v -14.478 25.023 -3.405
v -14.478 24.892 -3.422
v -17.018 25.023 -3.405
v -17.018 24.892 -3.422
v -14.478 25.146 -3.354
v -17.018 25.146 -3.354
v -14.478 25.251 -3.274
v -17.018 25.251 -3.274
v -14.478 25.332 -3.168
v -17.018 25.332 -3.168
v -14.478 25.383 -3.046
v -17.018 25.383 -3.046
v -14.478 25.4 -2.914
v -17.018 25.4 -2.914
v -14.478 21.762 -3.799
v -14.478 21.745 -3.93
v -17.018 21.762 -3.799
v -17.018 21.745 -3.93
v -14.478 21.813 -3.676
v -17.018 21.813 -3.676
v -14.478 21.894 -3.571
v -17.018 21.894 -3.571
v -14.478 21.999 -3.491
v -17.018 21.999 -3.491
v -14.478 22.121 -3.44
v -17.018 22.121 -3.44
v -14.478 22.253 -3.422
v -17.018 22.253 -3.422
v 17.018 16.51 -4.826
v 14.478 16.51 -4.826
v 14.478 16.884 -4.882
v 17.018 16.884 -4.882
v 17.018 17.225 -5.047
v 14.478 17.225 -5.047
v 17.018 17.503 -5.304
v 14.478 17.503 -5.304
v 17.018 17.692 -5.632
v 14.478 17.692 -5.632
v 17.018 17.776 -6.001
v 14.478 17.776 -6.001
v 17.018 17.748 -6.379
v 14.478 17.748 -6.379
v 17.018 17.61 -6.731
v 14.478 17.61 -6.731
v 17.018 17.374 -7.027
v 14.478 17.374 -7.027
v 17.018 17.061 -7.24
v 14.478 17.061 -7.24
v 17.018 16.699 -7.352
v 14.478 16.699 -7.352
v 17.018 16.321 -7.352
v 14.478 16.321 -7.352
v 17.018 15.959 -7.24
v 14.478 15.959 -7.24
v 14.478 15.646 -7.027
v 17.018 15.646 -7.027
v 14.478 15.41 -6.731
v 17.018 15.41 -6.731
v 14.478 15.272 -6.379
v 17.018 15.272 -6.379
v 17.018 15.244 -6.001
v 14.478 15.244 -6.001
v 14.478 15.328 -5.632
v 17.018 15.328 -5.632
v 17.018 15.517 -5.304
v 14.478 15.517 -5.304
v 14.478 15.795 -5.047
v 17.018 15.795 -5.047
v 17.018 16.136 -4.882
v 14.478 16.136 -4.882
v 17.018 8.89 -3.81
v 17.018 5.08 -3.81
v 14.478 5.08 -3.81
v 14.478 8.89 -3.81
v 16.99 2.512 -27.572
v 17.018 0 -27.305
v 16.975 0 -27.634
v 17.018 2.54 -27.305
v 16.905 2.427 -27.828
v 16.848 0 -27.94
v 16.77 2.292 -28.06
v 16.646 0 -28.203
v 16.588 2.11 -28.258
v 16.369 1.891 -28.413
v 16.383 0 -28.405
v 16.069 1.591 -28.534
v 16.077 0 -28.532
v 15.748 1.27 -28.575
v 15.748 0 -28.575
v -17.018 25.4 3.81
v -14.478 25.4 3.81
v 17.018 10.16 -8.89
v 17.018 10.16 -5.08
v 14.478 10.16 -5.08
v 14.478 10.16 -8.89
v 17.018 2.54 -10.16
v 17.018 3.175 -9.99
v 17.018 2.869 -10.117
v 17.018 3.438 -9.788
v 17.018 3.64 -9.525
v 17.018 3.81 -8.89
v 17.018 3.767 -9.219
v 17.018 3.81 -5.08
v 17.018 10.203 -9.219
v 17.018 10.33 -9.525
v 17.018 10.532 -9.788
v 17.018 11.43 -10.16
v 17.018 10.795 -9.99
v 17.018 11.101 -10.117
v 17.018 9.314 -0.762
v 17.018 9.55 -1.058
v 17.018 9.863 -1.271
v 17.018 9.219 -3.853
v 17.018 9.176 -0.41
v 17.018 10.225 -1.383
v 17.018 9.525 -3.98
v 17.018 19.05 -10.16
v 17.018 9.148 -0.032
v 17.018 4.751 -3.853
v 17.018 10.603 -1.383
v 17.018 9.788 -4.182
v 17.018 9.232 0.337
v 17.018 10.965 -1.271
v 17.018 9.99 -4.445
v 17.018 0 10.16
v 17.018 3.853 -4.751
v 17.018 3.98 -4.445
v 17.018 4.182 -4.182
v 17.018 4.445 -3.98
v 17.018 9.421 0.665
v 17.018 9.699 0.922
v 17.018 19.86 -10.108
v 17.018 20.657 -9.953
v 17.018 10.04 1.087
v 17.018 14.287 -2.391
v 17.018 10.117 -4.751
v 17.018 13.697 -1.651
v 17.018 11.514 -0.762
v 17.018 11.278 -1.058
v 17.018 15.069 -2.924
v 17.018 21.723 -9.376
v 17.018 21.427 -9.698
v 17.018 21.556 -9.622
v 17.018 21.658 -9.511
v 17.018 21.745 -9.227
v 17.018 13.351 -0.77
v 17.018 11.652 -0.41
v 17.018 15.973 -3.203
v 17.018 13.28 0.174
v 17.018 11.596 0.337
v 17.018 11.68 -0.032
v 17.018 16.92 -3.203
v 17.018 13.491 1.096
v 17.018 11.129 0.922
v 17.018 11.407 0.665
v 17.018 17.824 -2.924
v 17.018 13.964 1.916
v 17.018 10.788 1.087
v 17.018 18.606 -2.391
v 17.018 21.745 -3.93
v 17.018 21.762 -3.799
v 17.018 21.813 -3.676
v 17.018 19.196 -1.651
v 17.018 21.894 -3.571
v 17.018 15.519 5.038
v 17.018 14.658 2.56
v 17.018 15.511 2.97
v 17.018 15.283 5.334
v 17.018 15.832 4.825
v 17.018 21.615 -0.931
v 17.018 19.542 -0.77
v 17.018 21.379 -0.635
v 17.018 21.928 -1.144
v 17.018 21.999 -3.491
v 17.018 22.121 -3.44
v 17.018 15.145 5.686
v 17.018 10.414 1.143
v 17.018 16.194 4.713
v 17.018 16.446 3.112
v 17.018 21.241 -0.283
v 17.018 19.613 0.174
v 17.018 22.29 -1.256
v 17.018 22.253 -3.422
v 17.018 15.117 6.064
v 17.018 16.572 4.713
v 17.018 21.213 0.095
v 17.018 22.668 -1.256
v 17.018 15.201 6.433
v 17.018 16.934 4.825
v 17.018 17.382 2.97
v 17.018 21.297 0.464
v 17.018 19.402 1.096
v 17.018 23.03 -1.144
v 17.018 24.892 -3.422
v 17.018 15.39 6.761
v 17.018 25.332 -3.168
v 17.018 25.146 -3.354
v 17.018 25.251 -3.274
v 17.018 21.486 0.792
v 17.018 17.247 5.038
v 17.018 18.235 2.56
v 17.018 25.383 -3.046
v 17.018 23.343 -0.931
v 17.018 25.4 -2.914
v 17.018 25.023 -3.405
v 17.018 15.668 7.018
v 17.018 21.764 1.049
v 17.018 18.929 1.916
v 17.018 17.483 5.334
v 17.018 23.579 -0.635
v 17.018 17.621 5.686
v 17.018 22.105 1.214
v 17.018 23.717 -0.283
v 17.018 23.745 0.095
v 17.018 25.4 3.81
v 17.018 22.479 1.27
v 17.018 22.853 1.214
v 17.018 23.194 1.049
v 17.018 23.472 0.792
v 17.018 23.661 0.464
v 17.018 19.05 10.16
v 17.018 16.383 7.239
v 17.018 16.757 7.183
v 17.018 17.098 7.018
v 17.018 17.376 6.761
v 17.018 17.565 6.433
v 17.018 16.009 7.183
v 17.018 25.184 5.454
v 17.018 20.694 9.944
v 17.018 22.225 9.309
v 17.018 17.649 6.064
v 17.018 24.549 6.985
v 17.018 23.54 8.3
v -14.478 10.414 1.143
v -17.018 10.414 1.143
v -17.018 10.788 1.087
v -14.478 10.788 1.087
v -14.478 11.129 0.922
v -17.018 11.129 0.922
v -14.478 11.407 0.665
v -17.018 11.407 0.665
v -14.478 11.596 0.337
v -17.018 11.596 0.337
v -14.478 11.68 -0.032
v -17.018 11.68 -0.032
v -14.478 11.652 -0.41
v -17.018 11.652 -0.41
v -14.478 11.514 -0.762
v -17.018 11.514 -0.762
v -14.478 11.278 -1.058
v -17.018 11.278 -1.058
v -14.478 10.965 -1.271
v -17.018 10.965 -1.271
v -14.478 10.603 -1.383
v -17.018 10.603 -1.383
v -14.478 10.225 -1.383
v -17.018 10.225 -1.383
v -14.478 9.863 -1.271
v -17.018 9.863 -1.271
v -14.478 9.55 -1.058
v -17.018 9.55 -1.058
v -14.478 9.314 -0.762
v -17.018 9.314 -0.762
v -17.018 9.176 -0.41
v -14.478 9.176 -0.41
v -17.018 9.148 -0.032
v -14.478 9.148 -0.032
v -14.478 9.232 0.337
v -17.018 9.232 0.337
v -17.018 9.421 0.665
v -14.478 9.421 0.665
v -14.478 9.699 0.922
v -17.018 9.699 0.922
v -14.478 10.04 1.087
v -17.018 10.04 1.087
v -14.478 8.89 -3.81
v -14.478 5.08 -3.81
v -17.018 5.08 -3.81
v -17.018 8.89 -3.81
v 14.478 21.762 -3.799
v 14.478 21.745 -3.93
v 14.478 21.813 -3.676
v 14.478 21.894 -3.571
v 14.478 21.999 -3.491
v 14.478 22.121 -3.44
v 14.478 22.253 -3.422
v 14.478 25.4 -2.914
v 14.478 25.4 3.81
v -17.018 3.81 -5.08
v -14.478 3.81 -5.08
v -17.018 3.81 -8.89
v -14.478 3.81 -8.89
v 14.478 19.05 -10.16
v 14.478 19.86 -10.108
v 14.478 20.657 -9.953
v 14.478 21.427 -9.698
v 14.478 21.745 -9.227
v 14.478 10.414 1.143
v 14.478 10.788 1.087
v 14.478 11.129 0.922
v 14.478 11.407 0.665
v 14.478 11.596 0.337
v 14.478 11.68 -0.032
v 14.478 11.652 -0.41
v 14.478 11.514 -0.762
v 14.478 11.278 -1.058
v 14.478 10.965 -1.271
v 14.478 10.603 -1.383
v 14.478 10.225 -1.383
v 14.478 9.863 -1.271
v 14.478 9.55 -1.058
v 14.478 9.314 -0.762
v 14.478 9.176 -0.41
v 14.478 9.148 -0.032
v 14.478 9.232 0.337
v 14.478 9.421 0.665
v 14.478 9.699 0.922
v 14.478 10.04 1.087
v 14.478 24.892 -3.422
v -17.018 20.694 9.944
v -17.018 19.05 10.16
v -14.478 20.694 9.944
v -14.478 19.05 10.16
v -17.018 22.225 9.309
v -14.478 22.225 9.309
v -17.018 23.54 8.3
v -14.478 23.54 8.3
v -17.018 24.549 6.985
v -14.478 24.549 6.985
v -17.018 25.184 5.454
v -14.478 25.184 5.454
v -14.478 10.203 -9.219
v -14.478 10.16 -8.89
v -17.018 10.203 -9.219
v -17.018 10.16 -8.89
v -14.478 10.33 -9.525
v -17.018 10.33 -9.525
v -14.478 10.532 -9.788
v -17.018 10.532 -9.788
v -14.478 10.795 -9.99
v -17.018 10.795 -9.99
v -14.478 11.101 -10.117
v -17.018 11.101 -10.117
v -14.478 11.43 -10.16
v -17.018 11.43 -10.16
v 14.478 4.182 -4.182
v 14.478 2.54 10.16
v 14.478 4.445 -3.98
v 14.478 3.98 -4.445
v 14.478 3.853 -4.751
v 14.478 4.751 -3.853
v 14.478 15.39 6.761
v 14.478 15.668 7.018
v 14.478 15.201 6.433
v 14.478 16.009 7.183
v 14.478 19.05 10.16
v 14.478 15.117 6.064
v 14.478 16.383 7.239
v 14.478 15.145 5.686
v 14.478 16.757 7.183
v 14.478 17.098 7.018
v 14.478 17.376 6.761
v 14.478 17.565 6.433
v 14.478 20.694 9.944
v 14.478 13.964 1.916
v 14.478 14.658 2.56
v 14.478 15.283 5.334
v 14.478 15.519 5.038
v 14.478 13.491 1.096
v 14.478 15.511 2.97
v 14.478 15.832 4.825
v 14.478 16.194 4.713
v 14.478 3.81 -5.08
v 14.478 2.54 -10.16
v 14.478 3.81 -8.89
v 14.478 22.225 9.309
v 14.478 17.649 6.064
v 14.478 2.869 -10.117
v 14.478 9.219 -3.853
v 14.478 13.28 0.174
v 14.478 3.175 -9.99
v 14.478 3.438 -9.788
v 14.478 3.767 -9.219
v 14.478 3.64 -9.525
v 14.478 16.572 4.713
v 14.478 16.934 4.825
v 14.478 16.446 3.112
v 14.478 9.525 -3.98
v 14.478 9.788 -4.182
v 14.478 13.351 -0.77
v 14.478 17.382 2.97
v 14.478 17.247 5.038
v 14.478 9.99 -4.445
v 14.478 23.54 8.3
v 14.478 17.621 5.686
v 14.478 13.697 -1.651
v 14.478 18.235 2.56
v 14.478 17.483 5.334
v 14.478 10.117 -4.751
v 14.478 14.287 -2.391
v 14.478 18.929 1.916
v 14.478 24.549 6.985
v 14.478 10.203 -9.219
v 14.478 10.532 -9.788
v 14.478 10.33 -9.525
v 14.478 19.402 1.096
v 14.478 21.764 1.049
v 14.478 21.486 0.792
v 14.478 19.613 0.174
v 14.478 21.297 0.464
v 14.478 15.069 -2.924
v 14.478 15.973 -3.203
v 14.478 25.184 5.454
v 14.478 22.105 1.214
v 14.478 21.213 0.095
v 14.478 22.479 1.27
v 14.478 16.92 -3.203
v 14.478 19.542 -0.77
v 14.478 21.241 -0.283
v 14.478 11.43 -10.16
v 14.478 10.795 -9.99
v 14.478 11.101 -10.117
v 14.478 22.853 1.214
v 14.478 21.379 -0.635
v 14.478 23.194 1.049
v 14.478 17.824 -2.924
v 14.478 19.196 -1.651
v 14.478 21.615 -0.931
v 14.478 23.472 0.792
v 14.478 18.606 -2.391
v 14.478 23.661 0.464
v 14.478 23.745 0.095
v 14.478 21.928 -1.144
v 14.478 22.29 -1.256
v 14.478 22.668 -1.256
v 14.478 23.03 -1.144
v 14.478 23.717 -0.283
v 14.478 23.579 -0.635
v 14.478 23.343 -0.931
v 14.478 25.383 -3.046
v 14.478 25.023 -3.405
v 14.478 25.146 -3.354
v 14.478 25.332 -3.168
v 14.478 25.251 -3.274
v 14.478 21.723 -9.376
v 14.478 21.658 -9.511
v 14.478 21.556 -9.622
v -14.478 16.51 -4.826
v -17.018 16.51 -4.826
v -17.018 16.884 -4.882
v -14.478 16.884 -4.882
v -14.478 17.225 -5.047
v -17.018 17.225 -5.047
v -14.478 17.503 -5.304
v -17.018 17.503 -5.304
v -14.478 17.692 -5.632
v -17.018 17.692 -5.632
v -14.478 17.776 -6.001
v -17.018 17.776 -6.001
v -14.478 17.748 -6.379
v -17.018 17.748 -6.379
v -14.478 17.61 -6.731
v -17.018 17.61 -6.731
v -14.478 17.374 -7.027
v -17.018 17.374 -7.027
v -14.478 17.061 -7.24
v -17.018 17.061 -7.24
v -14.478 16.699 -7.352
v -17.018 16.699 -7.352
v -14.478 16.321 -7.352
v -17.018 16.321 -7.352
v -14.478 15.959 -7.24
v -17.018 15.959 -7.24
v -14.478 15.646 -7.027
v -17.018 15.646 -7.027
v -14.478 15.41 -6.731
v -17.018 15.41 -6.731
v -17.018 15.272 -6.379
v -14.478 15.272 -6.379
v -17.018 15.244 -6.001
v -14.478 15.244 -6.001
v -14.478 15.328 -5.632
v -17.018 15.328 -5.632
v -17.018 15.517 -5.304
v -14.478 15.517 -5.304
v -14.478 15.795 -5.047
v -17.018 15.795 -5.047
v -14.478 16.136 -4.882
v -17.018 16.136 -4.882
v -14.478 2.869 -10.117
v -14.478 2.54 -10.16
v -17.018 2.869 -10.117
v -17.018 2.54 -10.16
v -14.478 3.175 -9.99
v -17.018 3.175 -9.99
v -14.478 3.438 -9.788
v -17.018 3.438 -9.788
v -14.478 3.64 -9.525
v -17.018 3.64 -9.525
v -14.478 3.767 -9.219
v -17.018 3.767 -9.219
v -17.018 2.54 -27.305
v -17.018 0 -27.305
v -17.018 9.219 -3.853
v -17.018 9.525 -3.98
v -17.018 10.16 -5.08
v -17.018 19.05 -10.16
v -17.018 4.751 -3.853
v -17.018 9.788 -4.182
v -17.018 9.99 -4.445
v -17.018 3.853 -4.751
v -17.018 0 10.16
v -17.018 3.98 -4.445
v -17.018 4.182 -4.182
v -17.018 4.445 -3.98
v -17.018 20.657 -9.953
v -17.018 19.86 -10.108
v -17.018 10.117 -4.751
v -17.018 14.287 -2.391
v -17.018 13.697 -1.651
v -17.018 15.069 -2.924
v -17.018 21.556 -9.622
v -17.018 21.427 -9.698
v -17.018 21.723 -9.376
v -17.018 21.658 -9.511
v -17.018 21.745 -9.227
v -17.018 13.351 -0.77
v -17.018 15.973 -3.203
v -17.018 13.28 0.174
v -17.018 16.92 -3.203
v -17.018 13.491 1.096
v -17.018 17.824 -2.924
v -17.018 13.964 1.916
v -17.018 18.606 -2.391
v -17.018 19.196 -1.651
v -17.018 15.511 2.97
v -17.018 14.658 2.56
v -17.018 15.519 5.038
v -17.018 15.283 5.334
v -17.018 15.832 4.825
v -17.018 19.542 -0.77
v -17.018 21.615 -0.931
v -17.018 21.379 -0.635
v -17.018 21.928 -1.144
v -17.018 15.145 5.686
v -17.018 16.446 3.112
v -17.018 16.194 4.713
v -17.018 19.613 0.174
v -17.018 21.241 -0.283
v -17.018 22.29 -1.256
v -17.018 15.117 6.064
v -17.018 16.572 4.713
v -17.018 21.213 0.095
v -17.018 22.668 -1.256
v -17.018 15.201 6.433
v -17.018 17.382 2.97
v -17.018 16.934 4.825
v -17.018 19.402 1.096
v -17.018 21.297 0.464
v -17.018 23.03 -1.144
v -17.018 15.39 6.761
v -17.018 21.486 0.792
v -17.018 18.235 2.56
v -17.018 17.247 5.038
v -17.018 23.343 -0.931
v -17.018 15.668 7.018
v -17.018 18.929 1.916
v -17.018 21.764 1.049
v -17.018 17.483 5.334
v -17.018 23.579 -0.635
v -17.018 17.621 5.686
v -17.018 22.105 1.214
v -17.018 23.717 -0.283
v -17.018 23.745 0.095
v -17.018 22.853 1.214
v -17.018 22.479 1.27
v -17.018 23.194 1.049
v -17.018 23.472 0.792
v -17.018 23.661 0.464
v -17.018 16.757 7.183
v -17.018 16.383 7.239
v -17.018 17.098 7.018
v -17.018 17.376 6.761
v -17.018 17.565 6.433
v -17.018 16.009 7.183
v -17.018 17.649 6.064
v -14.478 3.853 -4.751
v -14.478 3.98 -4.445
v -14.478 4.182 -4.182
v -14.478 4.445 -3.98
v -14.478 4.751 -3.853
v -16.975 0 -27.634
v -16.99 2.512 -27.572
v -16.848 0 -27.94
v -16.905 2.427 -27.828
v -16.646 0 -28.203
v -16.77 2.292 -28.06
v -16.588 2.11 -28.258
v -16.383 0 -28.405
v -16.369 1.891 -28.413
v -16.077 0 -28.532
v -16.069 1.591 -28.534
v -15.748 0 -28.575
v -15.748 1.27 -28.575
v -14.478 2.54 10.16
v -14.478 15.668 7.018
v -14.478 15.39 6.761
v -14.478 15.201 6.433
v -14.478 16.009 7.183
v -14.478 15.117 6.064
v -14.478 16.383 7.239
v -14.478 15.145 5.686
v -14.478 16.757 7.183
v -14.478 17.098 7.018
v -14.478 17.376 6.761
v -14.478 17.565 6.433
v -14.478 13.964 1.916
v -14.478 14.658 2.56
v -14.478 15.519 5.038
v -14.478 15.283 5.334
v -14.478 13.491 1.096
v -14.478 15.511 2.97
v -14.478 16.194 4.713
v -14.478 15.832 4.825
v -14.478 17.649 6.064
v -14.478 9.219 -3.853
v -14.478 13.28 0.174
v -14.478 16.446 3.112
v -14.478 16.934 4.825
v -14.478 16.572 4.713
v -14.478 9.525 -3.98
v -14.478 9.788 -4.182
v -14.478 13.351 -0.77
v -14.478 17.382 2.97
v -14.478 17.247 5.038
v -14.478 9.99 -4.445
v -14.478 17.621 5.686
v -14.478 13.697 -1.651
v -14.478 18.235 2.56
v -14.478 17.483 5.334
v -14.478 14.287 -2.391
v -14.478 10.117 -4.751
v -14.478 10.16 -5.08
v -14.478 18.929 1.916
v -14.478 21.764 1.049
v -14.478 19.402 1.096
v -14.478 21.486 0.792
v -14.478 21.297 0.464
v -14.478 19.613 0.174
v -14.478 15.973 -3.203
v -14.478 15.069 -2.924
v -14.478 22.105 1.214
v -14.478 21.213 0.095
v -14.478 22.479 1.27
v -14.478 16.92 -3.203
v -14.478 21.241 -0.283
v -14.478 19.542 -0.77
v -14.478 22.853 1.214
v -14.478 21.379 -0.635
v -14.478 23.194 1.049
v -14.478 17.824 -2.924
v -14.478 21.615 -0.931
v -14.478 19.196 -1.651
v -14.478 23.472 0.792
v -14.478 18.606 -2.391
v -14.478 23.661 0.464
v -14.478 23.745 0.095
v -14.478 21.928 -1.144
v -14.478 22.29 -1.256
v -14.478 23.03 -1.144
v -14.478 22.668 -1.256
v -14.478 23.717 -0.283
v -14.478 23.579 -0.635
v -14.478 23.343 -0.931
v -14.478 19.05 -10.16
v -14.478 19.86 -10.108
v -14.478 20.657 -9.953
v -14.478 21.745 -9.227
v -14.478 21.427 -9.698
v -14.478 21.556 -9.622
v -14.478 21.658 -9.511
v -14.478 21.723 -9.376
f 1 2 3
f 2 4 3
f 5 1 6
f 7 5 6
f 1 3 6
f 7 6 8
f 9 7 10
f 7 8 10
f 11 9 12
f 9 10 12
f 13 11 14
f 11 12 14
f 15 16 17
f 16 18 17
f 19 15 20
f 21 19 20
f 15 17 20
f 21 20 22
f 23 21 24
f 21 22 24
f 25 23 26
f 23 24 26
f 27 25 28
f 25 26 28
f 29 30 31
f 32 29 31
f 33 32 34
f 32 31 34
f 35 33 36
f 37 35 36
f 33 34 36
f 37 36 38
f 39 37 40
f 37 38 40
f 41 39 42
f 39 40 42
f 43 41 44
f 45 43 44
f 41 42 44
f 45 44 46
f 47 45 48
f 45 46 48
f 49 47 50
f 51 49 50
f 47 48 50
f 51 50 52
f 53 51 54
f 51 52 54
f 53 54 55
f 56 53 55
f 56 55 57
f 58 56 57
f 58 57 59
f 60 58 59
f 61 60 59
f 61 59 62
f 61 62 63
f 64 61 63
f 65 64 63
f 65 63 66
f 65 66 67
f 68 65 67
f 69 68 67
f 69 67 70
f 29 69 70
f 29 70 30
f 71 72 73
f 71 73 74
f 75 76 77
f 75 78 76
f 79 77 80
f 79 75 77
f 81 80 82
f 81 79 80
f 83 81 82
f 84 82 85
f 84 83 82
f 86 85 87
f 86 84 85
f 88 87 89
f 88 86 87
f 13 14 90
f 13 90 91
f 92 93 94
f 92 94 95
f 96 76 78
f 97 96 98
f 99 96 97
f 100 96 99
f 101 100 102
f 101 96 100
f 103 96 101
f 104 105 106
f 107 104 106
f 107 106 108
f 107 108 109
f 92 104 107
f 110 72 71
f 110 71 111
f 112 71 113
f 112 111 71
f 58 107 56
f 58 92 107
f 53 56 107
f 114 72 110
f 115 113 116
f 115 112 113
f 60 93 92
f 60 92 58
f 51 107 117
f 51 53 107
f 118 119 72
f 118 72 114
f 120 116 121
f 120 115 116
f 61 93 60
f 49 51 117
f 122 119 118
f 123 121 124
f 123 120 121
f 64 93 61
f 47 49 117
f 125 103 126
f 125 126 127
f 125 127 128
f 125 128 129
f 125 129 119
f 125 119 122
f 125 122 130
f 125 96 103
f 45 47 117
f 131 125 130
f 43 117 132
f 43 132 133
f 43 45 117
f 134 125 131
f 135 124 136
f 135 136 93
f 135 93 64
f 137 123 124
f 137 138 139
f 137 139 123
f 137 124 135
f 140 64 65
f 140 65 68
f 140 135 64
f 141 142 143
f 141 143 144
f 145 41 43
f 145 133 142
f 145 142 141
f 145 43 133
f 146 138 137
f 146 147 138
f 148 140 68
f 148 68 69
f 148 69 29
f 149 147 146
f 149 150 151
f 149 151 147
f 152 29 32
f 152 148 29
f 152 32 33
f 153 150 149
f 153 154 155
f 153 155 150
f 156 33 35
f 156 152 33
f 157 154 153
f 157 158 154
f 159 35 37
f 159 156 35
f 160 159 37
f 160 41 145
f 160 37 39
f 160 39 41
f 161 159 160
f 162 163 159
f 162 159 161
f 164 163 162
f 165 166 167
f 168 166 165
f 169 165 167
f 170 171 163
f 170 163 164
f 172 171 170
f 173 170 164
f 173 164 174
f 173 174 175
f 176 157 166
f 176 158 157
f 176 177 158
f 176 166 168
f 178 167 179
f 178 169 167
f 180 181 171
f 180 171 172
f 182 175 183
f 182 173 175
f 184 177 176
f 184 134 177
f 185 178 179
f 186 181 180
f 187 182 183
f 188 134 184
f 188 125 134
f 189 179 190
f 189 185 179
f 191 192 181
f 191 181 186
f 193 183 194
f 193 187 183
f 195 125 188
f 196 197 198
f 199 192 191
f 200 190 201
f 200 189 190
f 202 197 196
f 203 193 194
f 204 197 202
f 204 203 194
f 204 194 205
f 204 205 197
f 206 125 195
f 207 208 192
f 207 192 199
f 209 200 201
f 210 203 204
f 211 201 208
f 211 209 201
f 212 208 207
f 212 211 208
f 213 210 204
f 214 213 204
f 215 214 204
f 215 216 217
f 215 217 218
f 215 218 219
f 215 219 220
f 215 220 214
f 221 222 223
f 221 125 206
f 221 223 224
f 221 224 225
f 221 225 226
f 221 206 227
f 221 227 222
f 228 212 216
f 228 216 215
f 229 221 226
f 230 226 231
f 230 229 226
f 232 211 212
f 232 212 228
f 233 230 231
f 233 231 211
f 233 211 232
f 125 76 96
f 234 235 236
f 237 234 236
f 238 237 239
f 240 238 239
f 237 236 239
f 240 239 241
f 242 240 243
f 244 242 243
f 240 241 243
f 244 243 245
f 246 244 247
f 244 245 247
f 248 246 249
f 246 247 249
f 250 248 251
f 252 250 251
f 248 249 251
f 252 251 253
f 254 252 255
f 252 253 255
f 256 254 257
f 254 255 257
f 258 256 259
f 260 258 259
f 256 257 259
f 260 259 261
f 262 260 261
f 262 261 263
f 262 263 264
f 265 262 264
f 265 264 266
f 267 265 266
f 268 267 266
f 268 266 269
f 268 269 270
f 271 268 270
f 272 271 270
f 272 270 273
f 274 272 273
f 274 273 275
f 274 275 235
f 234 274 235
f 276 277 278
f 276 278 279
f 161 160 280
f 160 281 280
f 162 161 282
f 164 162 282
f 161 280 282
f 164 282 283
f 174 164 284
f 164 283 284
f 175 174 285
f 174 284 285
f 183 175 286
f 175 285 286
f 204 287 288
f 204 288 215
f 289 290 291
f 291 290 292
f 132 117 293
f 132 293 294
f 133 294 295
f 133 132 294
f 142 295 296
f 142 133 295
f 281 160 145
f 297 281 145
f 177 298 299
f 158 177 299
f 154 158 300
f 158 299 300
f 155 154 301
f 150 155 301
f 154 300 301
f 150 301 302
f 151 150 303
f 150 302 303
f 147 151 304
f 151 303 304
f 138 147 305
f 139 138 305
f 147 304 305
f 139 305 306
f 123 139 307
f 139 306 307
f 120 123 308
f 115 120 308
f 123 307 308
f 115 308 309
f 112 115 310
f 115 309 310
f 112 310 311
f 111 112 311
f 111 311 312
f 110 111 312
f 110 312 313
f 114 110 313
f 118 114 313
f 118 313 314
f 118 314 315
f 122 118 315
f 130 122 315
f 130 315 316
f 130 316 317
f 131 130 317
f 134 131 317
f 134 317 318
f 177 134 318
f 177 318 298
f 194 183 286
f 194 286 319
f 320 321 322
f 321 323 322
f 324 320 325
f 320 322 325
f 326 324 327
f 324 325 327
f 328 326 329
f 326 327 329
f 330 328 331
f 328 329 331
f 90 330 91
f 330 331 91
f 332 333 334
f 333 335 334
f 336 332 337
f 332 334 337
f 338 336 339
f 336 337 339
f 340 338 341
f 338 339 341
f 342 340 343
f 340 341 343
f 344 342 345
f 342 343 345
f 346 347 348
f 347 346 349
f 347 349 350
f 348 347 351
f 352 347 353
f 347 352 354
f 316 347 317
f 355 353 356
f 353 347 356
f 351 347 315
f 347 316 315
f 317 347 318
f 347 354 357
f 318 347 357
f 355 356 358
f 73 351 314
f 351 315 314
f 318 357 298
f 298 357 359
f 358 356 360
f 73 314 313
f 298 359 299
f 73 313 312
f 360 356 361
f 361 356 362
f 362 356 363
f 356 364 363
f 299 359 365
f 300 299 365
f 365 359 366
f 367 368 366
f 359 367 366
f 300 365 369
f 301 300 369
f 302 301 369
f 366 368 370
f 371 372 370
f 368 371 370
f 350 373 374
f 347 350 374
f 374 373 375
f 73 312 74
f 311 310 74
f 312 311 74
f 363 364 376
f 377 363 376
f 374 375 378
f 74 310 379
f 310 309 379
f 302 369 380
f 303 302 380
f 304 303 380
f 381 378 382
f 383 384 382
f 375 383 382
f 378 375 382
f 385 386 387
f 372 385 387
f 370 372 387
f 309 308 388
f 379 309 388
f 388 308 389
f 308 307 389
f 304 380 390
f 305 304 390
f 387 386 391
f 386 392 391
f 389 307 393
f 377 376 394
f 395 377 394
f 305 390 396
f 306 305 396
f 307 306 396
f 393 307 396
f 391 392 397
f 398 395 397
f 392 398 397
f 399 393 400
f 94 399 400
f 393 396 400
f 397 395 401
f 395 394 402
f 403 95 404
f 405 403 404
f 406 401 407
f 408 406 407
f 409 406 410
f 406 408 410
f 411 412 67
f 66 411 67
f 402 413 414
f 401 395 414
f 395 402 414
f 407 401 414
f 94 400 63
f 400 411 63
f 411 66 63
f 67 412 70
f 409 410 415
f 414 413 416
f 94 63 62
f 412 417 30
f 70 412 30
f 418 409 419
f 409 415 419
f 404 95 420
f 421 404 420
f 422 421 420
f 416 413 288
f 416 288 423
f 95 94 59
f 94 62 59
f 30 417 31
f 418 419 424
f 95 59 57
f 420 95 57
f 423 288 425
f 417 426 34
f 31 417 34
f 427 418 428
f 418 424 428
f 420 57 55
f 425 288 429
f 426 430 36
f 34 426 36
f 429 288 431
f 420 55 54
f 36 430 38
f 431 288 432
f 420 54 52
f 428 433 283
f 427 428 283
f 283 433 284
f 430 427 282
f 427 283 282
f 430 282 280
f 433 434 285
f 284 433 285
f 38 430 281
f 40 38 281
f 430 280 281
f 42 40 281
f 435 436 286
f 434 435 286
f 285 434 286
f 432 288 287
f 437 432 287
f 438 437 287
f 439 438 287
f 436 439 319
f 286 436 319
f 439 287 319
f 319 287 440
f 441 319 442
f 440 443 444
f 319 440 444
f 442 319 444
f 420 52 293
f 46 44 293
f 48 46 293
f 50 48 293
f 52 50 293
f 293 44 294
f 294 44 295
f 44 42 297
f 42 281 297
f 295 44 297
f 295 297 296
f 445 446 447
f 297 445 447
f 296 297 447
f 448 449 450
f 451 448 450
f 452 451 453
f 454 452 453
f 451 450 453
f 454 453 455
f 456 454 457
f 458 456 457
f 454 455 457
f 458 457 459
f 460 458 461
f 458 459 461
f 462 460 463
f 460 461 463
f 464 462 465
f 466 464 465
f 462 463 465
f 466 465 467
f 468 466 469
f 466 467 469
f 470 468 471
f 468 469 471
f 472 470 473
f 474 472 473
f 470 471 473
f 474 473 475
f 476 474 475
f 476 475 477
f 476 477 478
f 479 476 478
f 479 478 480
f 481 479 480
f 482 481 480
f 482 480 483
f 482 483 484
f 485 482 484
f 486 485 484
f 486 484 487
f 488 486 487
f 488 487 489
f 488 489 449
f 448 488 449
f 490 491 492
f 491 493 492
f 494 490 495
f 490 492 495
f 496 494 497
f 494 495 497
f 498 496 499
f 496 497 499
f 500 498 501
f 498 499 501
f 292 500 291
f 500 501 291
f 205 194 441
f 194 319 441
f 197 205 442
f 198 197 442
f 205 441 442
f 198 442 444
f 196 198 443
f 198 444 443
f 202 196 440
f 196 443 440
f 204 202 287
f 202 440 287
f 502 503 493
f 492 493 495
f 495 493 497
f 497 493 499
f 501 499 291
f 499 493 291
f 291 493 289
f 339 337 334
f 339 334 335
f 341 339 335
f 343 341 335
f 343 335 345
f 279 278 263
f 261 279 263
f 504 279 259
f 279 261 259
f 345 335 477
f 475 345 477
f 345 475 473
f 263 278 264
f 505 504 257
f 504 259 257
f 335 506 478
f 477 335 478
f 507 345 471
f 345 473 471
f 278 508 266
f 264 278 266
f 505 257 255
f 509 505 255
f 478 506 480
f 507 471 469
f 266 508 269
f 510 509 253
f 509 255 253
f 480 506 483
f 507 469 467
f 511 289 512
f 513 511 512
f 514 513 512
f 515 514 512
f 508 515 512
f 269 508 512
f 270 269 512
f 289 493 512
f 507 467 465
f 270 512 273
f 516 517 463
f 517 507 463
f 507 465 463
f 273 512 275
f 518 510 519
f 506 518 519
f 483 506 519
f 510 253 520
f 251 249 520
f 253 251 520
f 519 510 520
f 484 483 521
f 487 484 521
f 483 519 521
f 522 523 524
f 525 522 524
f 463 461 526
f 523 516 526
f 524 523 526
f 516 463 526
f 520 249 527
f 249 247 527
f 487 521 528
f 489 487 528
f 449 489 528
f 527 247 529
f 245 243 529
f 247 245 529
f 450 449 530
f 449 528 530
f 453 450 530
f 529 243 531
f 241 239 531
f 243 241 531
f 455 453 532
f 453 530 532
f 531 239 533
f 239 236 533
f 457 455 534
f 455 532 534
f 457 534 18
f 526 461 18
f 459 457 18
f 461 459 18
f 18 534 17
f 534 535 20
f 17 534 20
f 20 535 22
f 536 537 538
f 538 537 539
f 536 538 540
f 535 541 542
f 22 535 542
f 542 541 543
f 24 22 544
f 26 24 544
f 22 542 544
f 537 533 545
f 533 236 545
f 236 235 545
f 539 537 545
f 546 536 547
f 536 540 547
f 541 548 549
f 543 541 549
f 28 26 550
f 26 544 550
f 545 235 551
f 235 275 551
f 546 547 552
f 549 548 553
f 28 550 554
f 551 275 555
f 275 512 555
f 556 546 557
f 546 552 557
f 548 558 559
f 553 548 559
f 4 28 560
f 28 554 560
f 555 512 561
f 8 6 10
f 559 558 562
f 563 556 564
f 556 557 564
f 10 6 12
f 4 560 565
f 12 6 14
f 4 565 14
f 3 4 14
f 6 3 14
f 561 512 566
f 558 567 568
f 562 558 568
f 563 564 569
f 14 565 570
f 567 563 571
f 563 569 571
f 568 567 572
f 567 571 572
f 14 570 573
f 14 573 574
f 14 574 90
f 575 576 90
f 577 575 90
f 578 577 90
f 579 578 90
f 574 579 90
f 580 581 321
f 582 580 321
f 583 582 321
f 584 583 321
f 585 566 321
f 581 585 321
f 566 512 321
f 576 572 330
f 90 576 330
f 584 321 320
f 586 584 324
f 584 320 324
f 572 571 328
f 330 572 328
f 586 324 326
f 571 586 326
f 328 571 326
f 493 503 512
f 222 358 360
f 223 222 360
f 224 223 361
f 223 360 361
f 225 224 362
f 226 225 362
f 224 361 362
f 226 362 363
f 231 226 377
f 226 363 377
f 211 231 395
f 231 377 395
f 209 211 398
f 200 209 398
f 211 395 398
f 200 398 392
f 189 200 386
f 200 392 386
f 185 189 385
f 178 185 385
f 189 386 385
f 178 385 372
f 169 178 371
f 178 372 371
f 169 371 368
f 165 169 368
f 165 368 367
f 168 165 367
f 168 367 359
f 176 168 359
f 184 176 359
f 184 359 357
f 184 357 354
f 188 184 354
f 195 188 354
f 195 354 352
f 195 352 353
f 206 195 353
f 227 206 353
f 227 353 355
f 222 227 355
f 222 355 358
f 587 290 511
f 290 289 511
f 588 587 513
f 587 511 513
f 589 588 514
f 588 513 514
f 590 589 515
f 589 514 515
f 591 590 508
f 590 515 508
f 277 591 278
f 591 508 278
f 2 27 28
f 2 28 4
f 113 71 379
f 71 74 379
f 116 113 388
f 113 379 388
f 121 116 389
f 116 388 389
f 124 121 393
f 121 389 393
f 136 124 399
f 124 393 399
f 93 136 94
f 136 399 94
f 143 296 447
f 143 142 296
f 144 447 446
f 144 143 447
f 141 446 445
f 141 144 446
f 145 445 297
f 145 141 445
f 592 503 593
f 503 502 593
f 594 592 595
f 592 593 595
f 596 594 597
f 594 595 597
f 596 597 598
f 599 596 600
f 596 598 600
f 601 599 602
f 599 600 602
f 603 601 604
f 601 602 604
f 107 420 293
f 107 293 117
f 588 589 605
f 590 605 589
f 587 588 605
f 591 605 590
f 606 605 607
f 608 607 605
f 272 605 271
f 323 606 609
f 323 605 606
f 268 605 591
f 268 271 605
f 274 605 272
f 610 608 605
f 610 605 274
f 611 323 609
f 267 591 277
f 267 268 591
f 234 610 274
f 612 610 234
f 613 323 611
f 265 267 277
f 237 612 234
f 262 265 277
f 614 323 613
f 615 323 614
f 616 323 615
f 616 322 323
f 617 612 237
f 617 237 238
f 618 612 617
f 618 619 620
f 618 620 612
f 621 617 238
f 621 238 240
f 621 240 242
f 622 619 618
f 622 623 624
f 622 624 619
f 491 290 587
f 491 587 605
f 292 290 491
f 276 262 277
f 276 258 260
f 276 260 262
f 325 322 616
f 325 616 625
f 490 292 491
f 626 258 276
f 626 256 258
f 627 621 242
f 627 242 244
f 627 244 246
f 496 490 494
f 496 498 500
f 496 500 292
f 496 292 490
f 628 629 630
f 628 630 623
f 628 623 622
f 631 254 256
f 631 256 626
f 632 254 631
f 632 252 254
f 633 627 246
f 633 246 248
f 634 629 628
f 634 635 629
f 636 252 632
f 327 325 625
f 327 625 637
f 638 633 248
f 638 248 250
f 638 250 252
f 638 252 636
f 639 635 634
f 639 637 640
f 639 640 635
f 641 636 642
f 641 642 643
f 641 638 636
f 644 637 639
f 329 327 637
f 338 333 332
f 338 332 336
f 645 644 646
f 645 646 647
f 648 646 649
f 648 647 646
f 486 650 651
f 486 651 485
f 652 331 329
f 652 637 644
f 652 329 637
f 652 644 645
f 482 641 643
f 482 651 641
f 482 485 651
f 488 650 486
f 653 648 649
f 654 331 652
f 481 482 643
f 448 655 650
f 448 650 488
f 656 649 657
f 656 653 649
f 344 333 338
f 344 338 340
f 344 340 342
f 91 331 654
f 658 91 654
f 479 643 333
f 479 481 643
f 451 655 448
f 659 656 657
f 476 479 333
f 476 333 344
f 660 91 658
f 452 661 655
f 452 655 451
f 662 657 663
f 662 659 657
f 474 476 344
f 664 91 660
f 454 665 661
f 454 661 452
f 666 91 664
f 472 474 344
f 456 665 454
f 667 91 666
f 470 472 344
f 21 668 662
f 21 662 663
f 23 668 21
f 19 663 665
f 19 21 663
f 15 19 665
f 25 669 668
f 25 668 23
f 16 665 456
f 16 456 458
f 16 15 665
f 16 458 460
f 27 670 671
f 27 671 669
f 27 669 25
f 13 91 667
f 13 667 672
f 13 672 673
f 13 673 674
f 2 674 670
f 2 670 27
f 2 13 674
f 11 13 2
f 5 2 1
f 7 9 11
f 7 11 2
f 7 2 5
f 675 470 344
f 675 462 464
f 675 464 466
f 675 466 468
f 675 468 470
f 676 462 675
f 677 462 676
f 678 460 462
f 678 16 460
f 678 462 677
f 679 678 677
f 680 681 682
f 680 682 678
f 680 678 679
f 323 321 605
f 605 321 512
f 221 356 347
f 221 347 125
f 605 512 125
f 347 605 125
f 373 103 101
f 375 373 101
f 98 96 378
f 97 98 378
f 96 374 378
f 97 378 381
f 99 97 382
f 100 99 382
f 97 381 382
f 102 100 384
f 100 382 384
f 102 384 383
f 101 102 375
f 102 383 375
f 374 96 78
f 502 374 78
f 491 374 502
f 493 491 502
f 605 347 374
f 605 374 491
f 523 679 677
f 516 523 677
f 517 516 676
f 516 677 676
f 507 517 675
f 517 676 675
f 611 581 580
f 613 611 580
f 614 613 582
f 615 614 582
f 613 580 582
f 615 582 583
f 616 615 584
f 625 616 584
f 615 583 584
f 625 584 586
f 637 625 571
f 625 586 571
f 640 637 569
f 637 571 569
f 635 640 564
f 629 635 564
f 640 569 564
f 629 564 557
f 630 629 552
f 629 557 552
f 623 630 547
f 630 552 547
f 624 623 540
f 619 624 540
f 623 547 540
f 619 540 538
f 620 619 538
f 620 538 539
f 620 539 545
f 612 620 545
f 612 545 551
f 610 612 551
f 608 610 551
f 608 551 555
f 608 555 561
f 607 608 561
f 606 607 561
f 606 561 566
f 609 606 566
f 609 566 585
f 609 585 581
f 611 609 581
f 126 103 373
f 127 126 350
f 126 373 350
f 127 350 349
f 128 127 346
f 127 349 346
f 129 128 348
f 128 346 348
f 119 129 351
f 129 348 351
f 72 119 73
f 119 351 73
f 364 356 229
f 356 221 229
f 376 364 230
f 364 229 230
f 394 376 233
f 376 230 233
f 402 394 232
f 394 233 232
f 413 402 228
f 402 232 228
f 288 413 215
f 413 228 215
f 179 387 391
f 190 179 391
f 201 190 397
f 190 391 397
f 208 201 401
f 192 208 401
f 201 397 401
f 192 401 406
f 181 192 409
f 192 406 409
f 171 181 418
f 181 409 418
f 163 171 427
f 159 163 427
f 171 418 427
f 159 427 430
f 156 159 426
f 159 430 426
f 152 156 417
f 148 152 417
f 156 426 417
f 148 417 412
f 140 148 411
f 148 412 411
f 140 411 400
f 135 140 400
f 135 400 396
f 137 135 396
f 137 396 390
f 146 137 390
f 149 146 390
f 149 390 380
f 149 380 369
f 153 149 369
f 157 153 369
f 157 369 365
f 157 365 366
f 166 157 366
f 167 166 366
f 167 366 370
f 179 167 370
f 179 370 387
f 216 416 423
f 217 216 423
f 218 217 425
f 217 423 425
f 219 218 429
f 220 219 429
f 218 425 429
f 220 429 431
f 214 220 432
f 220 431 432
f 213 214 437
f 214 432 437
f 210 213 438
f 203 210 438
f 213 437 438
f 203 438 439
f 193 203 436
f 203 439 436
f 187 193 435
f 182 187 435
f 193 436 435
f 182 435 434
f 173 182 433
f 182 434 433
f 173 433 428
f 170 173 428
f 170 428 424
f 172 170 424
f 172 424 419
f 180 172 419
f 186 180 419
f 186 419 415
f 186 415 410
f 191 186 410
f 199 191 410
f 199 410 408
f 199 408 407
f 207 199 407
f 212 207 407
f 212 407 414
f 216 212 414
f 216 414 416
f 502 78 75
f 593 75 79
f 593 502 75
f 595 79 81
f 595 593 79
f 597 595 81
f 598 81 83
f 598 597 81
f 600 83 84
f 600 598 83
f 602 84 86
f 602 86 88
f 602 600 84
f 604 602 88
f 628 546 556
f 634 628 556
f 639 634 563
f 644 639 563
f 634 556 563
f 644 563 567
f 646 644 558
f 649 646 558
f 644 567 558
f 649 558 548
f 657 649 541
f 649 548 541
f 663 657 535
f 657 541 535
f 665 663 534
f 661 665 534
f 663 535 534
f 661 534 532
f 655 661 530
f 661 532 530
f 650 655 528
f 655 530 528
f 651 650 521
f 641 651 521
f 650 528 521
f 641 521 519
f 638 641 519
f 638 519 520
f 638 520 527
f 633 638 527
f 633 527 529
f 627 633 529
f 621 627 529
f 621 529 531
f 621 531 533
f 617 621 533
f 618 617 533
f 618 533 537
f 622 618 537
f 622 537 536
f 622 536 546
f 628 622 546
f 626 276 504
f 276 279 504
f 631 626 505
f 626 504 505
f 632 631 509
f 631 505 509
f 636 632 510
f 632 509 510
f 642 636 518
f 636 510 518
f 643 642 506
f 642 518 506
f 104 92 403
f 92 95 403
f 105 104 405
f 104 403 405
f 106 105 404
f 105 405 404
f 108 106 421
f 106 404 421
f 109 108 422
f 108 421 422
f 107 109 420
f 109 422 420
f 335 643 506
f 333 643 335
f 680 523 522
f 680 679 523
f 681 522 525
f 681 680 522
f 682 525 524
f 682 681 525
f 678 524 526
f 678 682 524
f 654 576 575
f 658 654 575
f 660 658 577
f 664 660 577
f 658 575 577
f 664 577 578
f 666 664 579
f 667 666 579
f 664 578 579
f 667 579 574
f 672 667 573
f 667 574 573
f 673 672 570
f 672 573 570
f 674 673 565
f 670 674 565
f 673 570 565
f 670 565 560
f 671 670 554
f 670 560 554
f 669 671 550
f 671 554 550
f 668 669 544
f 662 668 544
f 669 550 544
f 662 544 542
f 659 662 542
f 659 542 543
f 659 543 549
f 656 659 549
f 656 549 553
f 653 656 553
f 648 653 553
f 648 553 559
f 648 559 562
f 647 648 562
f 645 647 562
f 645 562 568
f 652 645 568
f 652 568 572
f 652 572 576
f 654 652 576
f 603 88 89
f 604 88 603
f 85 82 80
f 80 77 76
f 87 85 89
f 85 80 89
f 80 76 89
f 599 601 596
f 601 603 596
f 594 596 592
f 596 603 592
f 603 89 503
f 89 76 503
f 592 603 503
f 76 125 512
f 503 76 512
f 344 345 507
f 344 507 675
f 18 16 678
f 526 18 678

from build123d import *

# Parameters (mm, degrees)
SKETCH1_W           = 34.036
SKETCH1_H           = 20.32
BOSS_EXTRUDE1_DEPTH = 25.4
SKETCH2_W           = 28.956
SKETCH2_H           = 20.32
CUT_EXTRUDE1_DEPTH  = 22.86
SKETCH3_R           = 1.27
SKETCH3_R_2         = 3.175
CUT_EXTRUDE2_DEPTH  = 44.667320687
FILLET2_R           = 6.35
SKETCH8_W           = 6.35
SKETCH8_H           = 6.35
CUT_EXTRUDE5_DEPTH  = 44.667320687
FILLET4_R           = 1.27
SKETCH10_W          = 8.835648684
SKETCH10_H          = 6.964146722
CUT_EXTRUDE6_DEPTH  = 44.667320687
FILLET6_R           = 0.508
FILLET7_R           = 0.508
SKETCH11_W          = 34.036
SKETCH11_H          = 2.54
BOSS_EXTRUDE3_DEPTH = 18.415
FILLET8_R           = 1.27


with BuildPart() as part:
    # Sketch1 → Boss-Extrude1 (new body)
    with BuildSketch(Plane(origin=(0, 0, 0), x_dir=(1, 0, 0), z_dir=(0, 1, 0))):
        Rectangle(SKETCH1_W, SKETCH1_H)
    extrude(amount=BOSS_EXTRUDE1_DEPTH)

    # Sketch2 → Cut-Extrude1 (cut)
    with BuildSketch(Plane(origin=(0, 25.4, 0), x_dir=(1, 0, 0), z_dir=(0, 1, 0))):
        Rectangle(SKETCH2_W, SKETCH2_H)
    extrude(amount=-CUT_EXTRUDE1_DEPTH, mode=Mode.SUBTRACT)

    # Sketch3 → Cut-Extrude2 (cut, through all)
    with BuildSketch(Plane.ZY.offset(17.018)):
        with Locations((0, 22.479)):
            Circle(SKETCH3_R)
        with Locations((-6.096, 16.51)):
            Circle(SKETCH3_R)
        with Locations((-0.127, 10.414)):
            Circle(SKETCH3_R)
        with Locations((5.969, 16.383)):
            Circle(SKETCH3_R)
        with Locations((-0.0635, 16.4465)):
            Circle(SKETCH3_R_2)
    extrude(amount=-CUT_EXTRUDE2_DEPTH, mode=Mode.SUBTRACT)

    # Fillet2
    fillet2_edges = [part.edges().sort_by_distance(p)[0] for p in [
        (-15.748, 25.4, -10.16),
        (15.748, 25.4, 10.16),
        (-15.748, 25.4, 10.16),
        (15.748, 25.4, -10.16),
    ]]
    fillet(fillet2_edges, radius=FILLET2_R)

    # Sketch8 → Cut-Extrude5 (cut, through all)
    with BuildSketch(Plane(origin=(17.018, 0, 0), x_dir=(0, 0, -1), z_dir=(1, 0, 0))):
        with Locations((6.985, 6.985)):
            Rectangle(SKETCH8_W, SKETCH8_H)
    extrude(amount=-CUT_EXTRUDE5_DEPTH, mode=Mode.SUBTRACT)

    # Fillet4
    fillet4_edges = [part.edges().sort_by_distance(p)[0] for p in [
        (15.748, 10.16, -10.16),
        (-15.748, 10.16, -10.16),
        (15.748, 3.81, -10.16),
        (-15.748, 3.81, -10.16),
        (15.748, 3.81, -3.81),
        (-15.748, 3.81, -3.81),
        (15.748, 10.16, -3.81),
        (-15.748, 10.16, -3.81),
    ]]
    fillet(fillet4_edges, radius=FILLET4_R)

    # Sketch10 → Cut-Extrude6 (cut, through all)
    with BuildSketch(Plane(origin=(17.018, 0, 0), x_dir=(0, 0, -1), z_dir=(1, 0, 0))):
        with Locations((7.840277159, 25.226914104)):
            Rectangle(SKETCH10_W, SKETCH10_H)
    extrude(amount=-CUT_EXTRUDE6_DEPTH, mode=Mode.SUBTRACT)

    # Fillet6
    fillet6_edges = [part.edges().sort_by_distance(p)[0] for p in [
        (15.748, 25.4, -3.422452817),
        (15.748, 21.744840743, -3.422452817),
        (15.748, 21.744840743, -9.559811594),
    ]]
    fillet(fillet6_edges, radius=FILLET6_R)

    # Fillet7
    fillet7_edges = [part.edges().sort_by_distance(p)[0] for p in [
        (-15.748, 21.744840743, -9.559811594),
        (-15.748, 25.4, -3.422452817),
        (-15.748, 21.744840743, -3.422452817),
    ]]
    fillet(fillet7_edges, radius=FILLET7_R)

    # Sketch11 → Boss-Extrude3 (add)
    with BuildSketch(Plane(origin=(0, 0, -10.16), x_dir=(-1, 0, 0), z_dir=(0, 0, -1))):
        with Locations((0, 1.27)):
            Rectangle(SKETCH11_W, SKETCH11_H)
    extrude(amount=BOSS_EXTRUDE3_DEPTH)

    # Fillet8
    fillet8_edges = [part.edges().sort_by_distance(p)[0] for p in [
        (17.018, 1.27, -28.575),
        (-17.018, 1.27, -28.575),
        (0, 2.54, -28.575),
    ]]
    fillet(fillet8_edges, radius=FILLET8_R)


solid = part.part
